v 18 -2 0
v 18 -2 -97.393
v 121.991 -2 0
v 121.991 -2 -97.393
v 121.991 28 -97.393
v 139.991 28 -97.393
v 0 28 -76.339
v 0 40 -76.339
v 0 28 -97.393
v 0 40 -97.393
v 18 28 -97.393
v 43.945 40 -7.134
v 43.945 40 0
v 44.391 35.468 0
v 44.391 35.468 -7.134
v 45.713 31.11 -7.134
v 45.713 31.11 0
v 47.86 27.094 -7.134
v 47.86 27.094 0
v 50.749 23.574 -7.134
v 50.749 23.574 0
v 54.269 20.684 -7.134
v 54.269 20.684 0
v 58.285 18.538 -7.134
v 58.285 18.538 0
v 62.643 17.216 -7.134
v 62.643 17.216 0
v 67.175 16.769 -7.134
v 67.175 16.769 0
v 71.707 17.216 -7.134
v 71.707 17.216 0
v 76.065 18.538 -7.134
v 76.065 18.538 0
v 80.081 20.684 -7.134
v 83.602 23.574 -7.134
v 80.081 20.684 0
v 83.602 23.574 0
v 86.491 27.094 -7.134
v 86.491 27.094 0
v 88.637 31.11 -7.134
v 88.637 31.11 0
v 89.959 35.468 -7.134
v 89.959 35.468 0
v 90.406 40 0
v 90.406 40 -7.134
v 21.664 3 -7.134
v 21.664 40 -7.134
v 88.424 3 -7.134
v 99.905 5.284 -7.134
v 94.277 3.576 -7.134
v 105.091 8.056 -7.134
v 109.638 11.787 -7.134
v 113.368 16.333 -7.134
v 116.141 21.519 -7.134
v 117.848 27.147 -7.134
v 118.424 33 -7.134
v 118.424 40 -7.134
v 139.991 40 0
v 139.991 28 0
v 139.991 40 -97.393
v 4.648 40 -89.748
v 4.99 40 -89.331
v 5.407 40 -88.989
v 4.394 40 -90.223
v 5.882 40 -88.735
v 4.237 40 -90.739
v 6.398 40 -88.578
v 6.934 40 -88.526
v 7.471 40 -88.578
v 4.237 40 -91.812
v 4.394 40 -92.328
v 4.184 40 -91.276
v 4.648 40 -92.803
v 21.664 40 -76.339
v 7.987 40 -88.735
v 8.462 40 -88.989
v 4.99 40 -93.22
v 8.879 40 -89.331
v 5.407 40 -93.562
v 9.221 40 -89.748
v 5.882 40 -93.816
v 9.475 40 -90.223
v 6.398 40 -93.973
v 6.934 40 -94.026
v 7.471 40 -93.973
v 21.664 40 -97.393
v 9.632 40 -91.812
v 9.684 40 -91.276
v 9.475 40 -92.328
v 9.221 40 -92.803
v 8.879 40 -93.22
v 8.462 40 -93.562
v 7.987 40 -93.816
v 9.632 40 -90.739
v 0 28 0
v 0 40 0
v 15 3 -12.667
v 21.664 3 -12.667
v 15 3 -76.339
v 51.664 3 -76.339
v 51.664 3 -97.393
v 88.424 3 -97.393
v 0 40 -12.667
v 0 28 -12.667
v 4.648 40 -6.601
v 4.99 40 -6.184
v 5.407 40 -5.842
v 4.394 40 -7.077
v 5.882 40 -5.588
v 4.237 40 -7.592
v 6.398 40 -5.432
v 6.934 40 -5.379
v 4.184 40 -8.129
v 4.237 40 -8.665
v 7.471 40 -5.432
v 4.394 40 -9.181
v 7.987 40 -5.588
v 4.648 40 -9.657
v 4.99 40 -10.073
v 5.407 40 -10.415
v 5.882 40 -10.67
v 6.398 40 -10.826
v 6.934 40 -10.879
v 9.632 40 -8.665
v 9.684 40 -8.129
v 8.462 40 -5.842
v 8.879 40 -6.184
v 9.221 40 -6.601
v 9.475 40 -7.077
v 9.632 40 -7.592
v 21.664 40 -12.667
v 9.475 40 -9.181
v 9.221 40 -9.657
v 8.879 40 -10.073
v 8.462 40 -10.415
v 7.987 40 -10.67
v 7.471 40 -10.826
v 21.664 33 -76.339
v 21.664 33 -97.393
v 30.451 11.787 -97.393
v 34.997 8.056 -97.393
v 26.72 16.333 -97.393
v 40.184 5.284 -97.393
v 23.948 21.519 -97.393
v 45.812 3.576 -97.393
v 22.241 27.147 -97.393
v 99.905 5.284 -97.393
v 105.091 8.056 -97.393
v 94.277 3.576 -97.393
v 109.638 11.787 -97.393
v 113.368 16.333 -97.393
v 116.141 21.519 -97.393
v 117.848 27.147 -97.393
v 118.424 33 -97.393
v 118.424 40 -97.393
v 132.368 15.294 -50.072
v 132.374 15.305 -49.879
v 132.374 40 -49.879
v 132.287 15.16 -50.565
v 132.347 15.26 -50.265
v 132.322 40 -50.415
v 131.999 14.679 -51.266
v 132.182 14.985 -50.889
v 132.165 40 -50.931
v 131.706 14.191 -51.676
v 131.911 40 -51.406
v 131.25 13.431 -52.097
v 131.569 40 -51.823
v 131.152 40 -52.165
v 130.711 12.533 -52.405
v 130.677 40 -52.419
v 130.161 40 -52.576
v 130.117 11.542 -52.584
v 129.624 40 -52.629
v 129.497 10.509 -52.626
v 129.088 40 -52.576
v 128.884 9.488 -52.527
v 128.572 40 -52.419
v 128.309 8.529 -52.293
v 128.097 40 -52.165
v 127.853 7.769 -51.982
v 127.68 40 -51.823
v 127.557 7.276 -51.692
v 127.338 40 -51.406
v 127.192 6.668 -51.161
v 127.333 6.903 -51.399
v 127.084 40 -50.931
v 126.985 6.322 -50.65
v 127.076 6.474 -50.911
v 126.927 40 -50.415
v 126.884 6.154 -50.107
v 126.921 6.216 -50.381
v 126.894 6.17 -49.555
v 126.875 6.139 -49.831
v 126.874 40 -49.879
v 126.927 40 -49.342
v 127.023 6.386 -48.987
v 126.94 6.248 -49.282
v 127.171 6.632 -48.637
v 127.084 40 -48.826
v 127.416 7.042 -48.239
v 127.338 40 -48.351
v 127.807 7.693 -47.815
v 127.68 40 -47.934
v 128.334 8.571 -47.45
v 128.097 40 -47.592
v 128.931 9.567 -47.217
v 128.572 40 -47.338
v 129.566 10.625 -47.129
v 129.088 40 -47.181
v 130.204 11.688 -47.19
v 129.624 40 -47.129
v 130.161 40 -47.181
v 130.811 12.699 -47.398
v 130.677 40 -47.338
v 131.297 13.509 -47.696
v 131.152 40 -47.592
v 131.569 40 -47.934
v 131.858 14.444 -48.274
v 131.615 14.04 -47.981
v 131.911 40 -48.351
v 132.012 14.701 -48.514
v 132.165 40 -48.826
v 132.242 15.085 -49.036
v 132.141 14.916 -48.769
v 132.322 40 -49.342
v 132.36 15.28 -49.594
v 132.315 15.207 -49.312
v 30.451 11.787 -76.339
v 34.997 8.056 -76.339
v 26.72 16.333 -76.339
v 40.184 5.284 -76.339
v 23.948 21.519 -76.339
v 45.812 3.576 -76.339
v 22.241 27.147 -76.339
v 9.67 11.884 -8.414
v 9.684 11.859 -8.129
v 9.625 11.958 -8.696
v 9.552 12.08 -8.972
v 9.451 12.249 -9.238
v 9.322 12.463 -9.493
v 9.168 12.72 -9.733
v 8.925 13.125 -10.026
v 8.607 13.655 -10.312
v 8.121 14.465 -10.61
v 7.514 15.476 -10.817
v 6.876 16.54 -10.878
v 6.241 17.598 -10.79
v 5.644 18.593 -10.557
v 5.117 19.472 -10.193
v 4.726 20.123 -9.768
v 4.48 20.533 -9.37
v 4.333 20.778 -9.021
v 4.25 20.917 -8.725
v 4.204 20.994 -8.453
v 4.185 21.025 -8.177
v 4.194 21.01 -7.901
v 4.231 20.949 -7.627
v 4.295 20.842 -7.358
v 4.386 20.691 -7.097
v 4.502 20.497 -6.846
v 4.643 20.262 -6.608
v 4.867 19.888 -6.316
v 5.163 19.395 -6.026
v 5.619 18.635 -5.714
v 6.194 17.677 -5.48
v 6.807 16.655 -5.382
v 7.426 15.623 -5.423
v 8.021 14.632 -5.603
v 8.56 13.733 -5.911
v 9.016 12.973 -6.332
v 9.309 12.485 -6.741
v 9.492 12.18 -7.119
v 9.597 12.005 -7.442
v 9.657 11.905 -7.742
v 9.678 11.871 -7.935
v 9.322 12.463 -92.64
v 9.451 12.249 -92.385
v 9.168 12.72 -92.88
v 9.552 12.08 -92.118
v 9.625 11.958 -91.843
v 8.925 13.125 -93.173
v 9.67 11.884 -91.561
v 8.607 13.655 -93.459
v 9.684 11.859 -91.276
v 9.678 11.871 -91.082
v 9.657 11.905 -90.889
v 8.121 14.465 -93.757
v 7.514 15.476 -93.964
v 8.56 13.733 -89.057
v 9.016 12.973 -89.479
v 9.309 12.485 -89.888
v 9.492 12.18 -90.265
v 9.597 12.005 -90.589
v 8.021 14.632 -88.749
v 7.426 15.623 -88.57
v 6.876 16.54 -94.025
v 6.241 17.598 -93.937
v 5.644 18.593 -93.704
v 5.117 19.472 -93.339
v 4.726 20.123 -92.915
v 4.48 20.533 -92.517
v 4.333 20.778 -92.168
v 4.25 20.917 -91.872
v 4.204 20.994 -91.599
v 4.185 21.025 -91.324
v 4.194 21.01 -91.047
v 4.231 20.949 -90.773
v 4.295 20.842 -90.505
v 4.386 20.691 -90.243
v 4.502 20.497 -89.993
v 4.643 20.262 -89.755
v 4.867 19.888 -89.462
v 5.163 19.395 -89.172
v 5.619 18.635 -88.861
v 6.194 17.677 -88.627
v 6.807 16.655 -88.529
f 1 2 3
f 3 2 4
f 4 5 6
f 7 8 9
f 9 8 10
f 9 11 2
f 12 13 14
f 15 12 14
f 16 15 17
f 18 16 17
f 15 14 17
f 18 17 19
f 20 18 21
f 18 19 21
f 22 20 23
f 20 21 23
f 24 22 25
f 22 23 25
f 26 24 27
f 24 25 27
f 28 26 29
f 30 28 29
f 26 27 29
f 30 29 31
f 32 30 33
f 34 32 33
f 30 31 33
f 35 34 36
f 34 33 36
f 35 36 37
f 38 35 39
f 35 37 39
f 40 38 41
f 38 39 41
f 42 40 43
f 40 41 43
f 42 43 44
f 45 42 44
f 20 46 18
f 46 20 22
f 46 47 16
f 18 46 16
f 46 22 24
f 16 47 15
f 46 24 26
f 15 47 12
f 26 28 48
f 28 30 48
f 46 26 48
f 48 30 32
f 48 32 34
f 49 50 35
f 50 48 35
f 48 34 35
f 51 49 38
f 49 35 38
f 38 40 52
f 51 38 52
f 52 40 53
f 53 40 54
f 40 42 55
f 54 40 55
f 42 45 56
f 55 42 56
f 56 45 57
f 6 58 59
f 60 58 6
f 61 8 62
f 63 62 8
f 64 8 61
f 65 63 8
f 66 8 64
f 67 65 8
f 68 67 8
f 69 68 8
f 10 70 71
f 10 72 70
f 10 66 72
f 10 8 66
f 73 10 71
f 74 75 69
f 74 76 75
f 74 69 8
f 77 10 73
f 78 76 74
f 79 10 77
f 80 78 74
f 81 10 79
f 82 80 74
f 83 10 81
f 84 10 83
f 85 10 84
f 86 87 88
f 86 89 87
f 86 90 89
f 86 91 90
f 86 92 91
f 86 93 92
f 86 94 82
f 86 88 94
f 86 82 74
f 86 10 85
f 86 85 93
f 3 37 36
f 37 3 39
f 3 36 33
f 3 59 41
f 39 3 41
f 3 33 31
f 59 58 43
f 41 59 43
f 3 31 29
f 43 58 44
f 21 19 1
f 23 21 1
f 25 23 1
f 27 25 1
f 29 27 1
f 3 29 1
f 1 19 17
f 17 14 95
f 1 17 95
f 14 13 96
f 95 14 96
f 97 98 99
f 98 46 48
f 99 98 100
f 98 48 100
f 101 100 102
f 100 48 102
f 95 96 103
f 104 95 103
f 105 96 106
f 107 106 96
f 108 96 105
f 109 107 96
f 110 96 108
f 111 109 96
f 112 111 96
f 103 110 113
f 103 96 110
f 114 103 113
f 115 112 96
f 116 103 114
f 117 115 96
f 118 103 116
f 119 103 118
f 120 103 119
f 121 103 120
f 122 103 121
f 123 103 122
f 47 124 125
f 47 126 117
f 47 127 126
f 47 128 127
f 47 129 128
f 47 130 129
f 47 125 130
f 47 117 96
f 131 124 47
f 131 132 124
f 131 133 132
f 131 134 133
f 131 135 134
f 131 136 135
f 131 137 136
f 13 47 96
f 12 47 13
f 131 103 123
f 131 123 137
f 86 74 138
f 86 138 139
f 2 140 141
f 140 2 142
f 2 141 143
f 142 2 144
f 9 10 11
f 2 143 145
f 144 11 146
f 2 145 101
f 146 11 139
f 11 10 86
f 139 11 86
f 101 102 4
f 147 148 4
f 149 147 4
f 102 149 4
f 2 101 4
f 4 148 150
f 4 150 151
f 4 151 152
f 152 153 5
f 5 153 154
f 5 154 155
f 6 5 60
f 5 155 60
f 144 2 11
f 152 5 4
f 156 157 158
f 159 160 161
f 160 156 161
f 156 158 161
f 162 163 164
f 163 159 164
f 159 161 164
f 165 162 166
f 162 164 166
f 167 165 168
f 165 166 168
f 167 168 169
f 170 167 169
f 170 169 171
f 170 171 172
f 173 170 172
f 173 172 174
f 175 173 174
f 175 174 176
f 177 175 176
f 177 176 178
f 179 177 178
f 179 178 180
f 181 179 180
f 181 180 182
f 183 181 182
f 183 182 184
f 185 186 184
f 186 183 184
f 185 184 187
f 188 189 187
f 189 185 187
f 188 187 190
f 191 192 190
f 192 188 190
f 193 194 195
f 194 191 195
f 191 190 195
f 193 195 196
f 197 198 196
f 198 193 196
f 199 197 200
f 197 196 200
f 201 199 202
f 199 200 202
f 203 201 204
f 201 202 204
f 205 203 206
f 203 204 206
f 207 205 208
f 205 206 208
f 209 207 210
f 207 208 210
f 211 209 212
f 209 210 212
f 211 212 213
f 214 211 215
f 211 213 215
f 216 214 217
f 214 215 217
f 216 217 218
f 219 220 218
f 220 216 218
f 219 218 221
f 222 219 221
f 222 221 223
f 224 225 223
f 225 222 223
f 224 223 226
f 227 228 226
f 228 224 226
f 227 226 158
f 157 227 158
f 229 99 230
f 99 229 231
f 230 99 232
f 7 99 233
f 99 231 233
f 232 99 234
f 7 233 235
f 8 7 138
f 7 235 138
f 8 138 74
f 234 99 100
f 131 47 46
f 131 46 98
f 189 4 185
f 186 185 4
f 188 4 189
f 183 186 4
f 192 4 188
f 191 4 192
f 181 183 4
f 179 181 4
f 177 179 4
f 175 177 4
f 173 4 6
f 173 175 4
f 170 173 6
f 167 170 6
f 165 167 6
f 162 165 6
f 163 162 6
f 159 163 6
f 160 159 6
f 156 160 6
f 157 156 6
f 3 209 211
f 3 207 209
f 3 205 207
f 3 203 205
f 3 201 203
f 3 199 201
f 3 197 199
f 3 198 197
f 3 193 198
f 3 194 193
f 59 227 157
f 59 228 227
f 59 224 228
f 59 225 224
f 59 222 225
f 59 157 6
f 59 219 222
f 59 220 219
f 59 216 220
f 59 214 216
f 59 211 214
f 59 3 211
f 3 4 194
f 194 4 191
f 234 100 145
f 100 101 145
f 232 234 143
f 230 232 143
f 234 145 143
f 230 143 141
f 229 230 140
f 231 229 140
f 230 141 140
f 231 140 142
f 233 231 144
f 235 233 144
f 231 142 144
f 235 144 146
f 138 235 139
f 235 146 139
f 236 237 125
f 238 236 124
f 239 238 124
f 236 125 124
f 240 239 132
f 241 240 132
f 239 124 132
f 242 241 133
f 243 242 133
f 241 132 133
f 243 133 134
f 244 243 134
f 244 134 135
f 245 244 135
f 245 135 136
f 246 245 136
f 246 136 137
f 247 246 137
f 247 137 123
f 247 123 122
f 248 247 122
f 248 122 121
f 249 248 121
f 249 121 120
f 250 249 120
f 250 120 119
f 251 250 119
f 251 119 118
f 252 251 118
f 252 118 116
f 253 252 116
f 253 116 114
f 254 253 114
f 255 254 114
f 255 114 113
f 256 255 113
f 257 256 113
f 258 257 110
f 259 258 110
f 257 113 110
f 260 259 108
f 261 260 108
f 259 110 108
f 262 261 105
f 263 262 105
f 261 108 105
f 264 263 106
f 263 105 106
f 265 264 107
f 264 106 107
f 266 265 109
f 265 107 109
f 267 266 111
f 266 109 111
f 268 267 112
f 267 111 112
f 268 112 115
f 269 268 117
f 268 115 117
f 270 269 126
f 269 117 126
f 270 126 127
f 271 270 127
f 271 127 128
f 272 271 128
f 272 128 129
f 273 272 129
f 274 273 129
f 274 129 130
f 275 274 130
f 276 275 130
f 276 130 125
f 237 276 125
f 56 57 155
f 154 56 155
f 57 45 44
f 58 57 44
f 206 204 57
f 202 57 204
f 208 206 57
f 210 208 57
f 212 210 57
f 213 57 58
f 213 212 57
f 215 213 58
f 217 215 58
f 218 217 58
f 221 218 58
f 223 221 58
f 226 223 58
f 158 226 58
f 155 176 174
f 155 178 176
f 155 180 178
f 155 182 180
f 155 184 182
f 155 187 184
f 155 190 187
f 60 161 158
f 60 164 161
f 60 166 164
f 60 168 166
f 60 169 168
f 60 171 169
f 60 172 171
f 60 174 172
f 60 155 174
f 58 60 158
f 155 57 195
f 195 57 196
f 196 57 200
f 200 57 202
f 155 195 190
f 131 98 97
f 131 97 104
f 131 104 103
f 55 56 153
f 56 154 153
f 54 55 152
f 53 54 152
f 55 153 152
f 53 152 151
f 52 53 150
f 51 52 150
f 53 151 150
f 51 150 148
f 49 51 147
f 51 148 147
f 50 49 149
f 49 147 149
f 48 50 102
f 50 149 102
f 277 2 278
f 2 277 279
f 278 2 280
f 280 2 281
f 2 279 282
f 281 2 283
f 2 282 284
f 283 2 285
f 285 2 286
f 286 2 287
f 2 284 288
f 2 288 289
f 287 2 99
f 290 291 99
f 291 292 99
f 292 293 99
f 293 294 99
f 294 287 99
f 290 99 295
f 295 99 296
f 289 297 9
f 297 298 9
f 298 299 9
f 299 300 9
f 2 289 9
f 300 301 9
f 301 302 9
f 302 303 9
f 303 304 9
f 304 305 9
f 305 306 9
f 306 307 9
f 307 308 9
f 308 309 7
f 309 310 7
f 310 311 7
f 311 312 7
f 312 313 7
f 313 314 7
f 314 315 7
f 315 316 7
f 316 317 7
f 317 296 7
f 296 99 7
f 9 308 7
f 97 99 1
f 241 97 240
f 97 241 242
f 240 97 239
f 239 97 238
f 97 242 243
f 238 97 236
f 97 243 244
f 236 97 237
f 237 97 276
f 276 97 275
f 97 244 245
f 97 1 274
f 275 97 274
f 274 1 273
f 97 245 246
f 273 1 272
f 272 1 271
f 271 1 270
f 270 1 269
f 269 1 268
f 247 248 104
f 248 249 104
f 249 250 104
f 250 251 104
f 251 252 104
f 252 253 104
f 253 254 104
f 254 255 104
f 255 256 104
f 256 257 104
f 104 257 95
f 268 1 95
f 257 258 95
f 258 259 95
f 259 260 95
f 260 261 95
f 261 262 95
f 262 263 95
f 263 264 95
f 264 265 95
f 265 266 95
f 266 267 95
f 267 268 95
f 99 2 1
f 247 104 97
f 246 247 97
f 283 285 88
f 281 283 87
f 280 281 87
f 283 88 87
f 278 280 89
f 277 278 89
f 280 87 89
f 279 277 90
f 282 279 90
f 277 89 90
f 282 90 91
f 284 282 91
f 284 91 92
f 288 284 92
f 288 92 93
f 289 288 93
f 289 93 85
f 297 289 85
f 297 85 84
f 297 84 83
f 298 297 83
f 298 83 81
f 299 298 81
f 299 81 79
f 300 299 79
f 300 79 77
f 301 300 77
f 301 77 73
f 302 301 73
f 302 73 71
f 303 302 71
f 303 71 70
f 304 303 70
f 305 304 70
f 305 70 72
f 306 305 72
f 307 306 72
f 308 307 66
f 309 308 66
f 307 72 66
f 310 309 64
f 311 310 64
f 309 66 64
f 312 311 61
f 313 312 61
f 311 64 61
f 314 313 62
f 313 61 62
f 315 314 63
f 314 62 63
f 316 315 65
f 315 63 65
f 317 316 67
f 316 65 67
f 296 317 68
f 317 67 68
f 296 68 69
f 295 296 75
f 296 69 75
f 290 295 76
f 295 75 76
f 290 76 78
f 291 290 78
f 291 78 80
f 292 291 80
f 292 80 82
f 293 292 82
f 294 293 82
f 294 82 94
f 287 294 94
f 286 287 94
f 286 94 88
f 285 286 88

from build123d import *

# Parameters (mm, degrees)
SKETCH1_W                           = 139.991389113
SKETCH1_H                           = 97.393342316
PICOVER_DEPTH                       = 40
PICOVER_DEPTH_BACK                  = 2
SKETCH2_W                           = 96.759944342
SKETCH2_H                           = 90.25941534
OPENINGFORPI_DEPTH                  = 37
SKETCH3_R                           = 23.23056694
HOLETOACCESSSDCARD_DEPTH            = 7.133927
SKETCH4_W                           = 18
SKETCH4_H                           = 97.393342316
CUTAWAYSTHATDEFINESCREWPLATES_DEPTH = 30
BOSS_EXTRUDE1_DEPTH                 = 97.393342
SKETCH6_W                           = 63.672875613
SKETCH6_H                           = 37
HOLEFORPOWERHDMIAUDIO_DEPTH         = 30
SKETCH5_R                           = 2.75
CUT_EXTRUDE5_DEPTH                  = 43
SKETCH7_R                           = 2.75
CUT_EXTRUDE7_DEPTH                  = 30
FILLET1_R                           = 30
FILLET2_R                           = 30


with BuildPart() as part:
    # Sketch1 → PiCover (new body, two sides)
    with BuildSketch(Plane(origin=(0, 0, 0), x_dir=(1, 0, 0), z_dir=(0, 1, 0))) as picover_sk:
        with Locations((69.995694556, 48.696671158)):
            Rectangle(SKETCH1_W, SKETCH1_H)
    extrude(amount=PICOVER_DEPTH)
    extrude(picover_sk.sketch, amount=-PICOVER_DEPTH_BACK)

    # Sketch2 → OpeningForPi (cut)
    with BuildSketch(Plane(origin=(0, 40, 0), x_dir=(1, 0, 0), z_dir=(0, 1, 0))):
        with Locations((70.044375284, 52.263634646)):
            Rectangle(SKETCH2_W, SKETCH2_H)
    extrude(amount=-OPENINGFORPI_DEPTH, mode=Mode.SUBTRACT)

    # Sketch3 → HoleToAccessSDCard (cut)
    with BuildSketch(Plane.XY):
        with Locations((67.175241294, 40)):
            Circle(SKETCH3_R)
    extrude(amount=-HOLETOACCESSSDCARD_DEPTH, mode=Mode.SUBTRACT)

    # Sketch4 → CutAwaysThatDefineScrewPlates (cut)
    with BuildSketch(Plane.XZ.offset(2)):
        with Locations((130.991389113, -48.696671158)):
            Rectangle(SKETCH4_W, SKETCH4_H)
        with Locations((9, -48.696671158)):
            Rectangle(SKETCH4_W, SKETCH4_H)
    extrude(amount=-CUTAWAYSTHATDEFINESCREWPLATES_DEPTH, mode=Mode.SUBTRACT)

    # Sketch11 → Boss-Extrude1 (add)
    with BuildSketch(Plane.XY):
        Polygon((0, 28), (18, 28), (18, -2), align=None)
        Polygon((139.991389113, 28), (121.991389113, 28), (121.991389113, -2), align=None)
    extrude(amount=-BOSS_EXTRUDE1_DEPTH)

    # Sketch6 → HoleForPowerHDMIAudio (cut)
    with BuildSketch(Plane(origin=(21.664403113, 0, 0), x_dir=(0, 0, -1), z_dir=(1, 0, 0))):
        with Locations((44.503037234, 21.5)):
            Rectangle(SKETCH6_W, SKETCH6_H)
    extrude(amount=-HOLEFORPOWERHDMIAUDIO_DEPTH, mode=Mode.SUBTRACT)

    # Sketch5 → Cut-Extrude5 (cut, through all)
    with BuildSketch(Plane(origin=(0, 40, 0), x_dir=(1, 0, 0), z_dir=(0, 1, 0))):
        with Locations((129.624485255, 49.878598174)):
            Circle(SKETCH5_R)
    extrude(amount=-CUT_EXTRUDE5_DEPTH, mode=Mode.SUBTRACT)

    # Sketch7 → Cut-Extrude7 (cut)
    with BuildSketch(Plane(origin=(0, 40, 0), x_dir=(1, 0, 0), z_dir=(0, 1, 0))):
        with Locations((6.934452889, 8.128892452)):
            Circle(SKETCH7_R)
        with Locations((6.934452889, 91.275593332)):
            Circle(SKETCH7_R)
    extrude(amount=-CUT_EXTRUDE7_DEPTH, mode=Mode.SUBTRACT)

    # Fillet1
    fillet1_edges = [part.edges().sort_by_distance(p)[0] for p in [
        (21.664403113, 3, -86.866408678),
    ]]
    fillet(fillet1_edges, radius=FILLET1_R)

    # Fillet2
    fillet2_edges = [part.edges().sort_by_distance(p)[0] for p in [
        (118.424347455, 3, -52.263634646),
    ]]
    fillet(fillet2_edges, radius=FILLET2_R)


solid = part.part
